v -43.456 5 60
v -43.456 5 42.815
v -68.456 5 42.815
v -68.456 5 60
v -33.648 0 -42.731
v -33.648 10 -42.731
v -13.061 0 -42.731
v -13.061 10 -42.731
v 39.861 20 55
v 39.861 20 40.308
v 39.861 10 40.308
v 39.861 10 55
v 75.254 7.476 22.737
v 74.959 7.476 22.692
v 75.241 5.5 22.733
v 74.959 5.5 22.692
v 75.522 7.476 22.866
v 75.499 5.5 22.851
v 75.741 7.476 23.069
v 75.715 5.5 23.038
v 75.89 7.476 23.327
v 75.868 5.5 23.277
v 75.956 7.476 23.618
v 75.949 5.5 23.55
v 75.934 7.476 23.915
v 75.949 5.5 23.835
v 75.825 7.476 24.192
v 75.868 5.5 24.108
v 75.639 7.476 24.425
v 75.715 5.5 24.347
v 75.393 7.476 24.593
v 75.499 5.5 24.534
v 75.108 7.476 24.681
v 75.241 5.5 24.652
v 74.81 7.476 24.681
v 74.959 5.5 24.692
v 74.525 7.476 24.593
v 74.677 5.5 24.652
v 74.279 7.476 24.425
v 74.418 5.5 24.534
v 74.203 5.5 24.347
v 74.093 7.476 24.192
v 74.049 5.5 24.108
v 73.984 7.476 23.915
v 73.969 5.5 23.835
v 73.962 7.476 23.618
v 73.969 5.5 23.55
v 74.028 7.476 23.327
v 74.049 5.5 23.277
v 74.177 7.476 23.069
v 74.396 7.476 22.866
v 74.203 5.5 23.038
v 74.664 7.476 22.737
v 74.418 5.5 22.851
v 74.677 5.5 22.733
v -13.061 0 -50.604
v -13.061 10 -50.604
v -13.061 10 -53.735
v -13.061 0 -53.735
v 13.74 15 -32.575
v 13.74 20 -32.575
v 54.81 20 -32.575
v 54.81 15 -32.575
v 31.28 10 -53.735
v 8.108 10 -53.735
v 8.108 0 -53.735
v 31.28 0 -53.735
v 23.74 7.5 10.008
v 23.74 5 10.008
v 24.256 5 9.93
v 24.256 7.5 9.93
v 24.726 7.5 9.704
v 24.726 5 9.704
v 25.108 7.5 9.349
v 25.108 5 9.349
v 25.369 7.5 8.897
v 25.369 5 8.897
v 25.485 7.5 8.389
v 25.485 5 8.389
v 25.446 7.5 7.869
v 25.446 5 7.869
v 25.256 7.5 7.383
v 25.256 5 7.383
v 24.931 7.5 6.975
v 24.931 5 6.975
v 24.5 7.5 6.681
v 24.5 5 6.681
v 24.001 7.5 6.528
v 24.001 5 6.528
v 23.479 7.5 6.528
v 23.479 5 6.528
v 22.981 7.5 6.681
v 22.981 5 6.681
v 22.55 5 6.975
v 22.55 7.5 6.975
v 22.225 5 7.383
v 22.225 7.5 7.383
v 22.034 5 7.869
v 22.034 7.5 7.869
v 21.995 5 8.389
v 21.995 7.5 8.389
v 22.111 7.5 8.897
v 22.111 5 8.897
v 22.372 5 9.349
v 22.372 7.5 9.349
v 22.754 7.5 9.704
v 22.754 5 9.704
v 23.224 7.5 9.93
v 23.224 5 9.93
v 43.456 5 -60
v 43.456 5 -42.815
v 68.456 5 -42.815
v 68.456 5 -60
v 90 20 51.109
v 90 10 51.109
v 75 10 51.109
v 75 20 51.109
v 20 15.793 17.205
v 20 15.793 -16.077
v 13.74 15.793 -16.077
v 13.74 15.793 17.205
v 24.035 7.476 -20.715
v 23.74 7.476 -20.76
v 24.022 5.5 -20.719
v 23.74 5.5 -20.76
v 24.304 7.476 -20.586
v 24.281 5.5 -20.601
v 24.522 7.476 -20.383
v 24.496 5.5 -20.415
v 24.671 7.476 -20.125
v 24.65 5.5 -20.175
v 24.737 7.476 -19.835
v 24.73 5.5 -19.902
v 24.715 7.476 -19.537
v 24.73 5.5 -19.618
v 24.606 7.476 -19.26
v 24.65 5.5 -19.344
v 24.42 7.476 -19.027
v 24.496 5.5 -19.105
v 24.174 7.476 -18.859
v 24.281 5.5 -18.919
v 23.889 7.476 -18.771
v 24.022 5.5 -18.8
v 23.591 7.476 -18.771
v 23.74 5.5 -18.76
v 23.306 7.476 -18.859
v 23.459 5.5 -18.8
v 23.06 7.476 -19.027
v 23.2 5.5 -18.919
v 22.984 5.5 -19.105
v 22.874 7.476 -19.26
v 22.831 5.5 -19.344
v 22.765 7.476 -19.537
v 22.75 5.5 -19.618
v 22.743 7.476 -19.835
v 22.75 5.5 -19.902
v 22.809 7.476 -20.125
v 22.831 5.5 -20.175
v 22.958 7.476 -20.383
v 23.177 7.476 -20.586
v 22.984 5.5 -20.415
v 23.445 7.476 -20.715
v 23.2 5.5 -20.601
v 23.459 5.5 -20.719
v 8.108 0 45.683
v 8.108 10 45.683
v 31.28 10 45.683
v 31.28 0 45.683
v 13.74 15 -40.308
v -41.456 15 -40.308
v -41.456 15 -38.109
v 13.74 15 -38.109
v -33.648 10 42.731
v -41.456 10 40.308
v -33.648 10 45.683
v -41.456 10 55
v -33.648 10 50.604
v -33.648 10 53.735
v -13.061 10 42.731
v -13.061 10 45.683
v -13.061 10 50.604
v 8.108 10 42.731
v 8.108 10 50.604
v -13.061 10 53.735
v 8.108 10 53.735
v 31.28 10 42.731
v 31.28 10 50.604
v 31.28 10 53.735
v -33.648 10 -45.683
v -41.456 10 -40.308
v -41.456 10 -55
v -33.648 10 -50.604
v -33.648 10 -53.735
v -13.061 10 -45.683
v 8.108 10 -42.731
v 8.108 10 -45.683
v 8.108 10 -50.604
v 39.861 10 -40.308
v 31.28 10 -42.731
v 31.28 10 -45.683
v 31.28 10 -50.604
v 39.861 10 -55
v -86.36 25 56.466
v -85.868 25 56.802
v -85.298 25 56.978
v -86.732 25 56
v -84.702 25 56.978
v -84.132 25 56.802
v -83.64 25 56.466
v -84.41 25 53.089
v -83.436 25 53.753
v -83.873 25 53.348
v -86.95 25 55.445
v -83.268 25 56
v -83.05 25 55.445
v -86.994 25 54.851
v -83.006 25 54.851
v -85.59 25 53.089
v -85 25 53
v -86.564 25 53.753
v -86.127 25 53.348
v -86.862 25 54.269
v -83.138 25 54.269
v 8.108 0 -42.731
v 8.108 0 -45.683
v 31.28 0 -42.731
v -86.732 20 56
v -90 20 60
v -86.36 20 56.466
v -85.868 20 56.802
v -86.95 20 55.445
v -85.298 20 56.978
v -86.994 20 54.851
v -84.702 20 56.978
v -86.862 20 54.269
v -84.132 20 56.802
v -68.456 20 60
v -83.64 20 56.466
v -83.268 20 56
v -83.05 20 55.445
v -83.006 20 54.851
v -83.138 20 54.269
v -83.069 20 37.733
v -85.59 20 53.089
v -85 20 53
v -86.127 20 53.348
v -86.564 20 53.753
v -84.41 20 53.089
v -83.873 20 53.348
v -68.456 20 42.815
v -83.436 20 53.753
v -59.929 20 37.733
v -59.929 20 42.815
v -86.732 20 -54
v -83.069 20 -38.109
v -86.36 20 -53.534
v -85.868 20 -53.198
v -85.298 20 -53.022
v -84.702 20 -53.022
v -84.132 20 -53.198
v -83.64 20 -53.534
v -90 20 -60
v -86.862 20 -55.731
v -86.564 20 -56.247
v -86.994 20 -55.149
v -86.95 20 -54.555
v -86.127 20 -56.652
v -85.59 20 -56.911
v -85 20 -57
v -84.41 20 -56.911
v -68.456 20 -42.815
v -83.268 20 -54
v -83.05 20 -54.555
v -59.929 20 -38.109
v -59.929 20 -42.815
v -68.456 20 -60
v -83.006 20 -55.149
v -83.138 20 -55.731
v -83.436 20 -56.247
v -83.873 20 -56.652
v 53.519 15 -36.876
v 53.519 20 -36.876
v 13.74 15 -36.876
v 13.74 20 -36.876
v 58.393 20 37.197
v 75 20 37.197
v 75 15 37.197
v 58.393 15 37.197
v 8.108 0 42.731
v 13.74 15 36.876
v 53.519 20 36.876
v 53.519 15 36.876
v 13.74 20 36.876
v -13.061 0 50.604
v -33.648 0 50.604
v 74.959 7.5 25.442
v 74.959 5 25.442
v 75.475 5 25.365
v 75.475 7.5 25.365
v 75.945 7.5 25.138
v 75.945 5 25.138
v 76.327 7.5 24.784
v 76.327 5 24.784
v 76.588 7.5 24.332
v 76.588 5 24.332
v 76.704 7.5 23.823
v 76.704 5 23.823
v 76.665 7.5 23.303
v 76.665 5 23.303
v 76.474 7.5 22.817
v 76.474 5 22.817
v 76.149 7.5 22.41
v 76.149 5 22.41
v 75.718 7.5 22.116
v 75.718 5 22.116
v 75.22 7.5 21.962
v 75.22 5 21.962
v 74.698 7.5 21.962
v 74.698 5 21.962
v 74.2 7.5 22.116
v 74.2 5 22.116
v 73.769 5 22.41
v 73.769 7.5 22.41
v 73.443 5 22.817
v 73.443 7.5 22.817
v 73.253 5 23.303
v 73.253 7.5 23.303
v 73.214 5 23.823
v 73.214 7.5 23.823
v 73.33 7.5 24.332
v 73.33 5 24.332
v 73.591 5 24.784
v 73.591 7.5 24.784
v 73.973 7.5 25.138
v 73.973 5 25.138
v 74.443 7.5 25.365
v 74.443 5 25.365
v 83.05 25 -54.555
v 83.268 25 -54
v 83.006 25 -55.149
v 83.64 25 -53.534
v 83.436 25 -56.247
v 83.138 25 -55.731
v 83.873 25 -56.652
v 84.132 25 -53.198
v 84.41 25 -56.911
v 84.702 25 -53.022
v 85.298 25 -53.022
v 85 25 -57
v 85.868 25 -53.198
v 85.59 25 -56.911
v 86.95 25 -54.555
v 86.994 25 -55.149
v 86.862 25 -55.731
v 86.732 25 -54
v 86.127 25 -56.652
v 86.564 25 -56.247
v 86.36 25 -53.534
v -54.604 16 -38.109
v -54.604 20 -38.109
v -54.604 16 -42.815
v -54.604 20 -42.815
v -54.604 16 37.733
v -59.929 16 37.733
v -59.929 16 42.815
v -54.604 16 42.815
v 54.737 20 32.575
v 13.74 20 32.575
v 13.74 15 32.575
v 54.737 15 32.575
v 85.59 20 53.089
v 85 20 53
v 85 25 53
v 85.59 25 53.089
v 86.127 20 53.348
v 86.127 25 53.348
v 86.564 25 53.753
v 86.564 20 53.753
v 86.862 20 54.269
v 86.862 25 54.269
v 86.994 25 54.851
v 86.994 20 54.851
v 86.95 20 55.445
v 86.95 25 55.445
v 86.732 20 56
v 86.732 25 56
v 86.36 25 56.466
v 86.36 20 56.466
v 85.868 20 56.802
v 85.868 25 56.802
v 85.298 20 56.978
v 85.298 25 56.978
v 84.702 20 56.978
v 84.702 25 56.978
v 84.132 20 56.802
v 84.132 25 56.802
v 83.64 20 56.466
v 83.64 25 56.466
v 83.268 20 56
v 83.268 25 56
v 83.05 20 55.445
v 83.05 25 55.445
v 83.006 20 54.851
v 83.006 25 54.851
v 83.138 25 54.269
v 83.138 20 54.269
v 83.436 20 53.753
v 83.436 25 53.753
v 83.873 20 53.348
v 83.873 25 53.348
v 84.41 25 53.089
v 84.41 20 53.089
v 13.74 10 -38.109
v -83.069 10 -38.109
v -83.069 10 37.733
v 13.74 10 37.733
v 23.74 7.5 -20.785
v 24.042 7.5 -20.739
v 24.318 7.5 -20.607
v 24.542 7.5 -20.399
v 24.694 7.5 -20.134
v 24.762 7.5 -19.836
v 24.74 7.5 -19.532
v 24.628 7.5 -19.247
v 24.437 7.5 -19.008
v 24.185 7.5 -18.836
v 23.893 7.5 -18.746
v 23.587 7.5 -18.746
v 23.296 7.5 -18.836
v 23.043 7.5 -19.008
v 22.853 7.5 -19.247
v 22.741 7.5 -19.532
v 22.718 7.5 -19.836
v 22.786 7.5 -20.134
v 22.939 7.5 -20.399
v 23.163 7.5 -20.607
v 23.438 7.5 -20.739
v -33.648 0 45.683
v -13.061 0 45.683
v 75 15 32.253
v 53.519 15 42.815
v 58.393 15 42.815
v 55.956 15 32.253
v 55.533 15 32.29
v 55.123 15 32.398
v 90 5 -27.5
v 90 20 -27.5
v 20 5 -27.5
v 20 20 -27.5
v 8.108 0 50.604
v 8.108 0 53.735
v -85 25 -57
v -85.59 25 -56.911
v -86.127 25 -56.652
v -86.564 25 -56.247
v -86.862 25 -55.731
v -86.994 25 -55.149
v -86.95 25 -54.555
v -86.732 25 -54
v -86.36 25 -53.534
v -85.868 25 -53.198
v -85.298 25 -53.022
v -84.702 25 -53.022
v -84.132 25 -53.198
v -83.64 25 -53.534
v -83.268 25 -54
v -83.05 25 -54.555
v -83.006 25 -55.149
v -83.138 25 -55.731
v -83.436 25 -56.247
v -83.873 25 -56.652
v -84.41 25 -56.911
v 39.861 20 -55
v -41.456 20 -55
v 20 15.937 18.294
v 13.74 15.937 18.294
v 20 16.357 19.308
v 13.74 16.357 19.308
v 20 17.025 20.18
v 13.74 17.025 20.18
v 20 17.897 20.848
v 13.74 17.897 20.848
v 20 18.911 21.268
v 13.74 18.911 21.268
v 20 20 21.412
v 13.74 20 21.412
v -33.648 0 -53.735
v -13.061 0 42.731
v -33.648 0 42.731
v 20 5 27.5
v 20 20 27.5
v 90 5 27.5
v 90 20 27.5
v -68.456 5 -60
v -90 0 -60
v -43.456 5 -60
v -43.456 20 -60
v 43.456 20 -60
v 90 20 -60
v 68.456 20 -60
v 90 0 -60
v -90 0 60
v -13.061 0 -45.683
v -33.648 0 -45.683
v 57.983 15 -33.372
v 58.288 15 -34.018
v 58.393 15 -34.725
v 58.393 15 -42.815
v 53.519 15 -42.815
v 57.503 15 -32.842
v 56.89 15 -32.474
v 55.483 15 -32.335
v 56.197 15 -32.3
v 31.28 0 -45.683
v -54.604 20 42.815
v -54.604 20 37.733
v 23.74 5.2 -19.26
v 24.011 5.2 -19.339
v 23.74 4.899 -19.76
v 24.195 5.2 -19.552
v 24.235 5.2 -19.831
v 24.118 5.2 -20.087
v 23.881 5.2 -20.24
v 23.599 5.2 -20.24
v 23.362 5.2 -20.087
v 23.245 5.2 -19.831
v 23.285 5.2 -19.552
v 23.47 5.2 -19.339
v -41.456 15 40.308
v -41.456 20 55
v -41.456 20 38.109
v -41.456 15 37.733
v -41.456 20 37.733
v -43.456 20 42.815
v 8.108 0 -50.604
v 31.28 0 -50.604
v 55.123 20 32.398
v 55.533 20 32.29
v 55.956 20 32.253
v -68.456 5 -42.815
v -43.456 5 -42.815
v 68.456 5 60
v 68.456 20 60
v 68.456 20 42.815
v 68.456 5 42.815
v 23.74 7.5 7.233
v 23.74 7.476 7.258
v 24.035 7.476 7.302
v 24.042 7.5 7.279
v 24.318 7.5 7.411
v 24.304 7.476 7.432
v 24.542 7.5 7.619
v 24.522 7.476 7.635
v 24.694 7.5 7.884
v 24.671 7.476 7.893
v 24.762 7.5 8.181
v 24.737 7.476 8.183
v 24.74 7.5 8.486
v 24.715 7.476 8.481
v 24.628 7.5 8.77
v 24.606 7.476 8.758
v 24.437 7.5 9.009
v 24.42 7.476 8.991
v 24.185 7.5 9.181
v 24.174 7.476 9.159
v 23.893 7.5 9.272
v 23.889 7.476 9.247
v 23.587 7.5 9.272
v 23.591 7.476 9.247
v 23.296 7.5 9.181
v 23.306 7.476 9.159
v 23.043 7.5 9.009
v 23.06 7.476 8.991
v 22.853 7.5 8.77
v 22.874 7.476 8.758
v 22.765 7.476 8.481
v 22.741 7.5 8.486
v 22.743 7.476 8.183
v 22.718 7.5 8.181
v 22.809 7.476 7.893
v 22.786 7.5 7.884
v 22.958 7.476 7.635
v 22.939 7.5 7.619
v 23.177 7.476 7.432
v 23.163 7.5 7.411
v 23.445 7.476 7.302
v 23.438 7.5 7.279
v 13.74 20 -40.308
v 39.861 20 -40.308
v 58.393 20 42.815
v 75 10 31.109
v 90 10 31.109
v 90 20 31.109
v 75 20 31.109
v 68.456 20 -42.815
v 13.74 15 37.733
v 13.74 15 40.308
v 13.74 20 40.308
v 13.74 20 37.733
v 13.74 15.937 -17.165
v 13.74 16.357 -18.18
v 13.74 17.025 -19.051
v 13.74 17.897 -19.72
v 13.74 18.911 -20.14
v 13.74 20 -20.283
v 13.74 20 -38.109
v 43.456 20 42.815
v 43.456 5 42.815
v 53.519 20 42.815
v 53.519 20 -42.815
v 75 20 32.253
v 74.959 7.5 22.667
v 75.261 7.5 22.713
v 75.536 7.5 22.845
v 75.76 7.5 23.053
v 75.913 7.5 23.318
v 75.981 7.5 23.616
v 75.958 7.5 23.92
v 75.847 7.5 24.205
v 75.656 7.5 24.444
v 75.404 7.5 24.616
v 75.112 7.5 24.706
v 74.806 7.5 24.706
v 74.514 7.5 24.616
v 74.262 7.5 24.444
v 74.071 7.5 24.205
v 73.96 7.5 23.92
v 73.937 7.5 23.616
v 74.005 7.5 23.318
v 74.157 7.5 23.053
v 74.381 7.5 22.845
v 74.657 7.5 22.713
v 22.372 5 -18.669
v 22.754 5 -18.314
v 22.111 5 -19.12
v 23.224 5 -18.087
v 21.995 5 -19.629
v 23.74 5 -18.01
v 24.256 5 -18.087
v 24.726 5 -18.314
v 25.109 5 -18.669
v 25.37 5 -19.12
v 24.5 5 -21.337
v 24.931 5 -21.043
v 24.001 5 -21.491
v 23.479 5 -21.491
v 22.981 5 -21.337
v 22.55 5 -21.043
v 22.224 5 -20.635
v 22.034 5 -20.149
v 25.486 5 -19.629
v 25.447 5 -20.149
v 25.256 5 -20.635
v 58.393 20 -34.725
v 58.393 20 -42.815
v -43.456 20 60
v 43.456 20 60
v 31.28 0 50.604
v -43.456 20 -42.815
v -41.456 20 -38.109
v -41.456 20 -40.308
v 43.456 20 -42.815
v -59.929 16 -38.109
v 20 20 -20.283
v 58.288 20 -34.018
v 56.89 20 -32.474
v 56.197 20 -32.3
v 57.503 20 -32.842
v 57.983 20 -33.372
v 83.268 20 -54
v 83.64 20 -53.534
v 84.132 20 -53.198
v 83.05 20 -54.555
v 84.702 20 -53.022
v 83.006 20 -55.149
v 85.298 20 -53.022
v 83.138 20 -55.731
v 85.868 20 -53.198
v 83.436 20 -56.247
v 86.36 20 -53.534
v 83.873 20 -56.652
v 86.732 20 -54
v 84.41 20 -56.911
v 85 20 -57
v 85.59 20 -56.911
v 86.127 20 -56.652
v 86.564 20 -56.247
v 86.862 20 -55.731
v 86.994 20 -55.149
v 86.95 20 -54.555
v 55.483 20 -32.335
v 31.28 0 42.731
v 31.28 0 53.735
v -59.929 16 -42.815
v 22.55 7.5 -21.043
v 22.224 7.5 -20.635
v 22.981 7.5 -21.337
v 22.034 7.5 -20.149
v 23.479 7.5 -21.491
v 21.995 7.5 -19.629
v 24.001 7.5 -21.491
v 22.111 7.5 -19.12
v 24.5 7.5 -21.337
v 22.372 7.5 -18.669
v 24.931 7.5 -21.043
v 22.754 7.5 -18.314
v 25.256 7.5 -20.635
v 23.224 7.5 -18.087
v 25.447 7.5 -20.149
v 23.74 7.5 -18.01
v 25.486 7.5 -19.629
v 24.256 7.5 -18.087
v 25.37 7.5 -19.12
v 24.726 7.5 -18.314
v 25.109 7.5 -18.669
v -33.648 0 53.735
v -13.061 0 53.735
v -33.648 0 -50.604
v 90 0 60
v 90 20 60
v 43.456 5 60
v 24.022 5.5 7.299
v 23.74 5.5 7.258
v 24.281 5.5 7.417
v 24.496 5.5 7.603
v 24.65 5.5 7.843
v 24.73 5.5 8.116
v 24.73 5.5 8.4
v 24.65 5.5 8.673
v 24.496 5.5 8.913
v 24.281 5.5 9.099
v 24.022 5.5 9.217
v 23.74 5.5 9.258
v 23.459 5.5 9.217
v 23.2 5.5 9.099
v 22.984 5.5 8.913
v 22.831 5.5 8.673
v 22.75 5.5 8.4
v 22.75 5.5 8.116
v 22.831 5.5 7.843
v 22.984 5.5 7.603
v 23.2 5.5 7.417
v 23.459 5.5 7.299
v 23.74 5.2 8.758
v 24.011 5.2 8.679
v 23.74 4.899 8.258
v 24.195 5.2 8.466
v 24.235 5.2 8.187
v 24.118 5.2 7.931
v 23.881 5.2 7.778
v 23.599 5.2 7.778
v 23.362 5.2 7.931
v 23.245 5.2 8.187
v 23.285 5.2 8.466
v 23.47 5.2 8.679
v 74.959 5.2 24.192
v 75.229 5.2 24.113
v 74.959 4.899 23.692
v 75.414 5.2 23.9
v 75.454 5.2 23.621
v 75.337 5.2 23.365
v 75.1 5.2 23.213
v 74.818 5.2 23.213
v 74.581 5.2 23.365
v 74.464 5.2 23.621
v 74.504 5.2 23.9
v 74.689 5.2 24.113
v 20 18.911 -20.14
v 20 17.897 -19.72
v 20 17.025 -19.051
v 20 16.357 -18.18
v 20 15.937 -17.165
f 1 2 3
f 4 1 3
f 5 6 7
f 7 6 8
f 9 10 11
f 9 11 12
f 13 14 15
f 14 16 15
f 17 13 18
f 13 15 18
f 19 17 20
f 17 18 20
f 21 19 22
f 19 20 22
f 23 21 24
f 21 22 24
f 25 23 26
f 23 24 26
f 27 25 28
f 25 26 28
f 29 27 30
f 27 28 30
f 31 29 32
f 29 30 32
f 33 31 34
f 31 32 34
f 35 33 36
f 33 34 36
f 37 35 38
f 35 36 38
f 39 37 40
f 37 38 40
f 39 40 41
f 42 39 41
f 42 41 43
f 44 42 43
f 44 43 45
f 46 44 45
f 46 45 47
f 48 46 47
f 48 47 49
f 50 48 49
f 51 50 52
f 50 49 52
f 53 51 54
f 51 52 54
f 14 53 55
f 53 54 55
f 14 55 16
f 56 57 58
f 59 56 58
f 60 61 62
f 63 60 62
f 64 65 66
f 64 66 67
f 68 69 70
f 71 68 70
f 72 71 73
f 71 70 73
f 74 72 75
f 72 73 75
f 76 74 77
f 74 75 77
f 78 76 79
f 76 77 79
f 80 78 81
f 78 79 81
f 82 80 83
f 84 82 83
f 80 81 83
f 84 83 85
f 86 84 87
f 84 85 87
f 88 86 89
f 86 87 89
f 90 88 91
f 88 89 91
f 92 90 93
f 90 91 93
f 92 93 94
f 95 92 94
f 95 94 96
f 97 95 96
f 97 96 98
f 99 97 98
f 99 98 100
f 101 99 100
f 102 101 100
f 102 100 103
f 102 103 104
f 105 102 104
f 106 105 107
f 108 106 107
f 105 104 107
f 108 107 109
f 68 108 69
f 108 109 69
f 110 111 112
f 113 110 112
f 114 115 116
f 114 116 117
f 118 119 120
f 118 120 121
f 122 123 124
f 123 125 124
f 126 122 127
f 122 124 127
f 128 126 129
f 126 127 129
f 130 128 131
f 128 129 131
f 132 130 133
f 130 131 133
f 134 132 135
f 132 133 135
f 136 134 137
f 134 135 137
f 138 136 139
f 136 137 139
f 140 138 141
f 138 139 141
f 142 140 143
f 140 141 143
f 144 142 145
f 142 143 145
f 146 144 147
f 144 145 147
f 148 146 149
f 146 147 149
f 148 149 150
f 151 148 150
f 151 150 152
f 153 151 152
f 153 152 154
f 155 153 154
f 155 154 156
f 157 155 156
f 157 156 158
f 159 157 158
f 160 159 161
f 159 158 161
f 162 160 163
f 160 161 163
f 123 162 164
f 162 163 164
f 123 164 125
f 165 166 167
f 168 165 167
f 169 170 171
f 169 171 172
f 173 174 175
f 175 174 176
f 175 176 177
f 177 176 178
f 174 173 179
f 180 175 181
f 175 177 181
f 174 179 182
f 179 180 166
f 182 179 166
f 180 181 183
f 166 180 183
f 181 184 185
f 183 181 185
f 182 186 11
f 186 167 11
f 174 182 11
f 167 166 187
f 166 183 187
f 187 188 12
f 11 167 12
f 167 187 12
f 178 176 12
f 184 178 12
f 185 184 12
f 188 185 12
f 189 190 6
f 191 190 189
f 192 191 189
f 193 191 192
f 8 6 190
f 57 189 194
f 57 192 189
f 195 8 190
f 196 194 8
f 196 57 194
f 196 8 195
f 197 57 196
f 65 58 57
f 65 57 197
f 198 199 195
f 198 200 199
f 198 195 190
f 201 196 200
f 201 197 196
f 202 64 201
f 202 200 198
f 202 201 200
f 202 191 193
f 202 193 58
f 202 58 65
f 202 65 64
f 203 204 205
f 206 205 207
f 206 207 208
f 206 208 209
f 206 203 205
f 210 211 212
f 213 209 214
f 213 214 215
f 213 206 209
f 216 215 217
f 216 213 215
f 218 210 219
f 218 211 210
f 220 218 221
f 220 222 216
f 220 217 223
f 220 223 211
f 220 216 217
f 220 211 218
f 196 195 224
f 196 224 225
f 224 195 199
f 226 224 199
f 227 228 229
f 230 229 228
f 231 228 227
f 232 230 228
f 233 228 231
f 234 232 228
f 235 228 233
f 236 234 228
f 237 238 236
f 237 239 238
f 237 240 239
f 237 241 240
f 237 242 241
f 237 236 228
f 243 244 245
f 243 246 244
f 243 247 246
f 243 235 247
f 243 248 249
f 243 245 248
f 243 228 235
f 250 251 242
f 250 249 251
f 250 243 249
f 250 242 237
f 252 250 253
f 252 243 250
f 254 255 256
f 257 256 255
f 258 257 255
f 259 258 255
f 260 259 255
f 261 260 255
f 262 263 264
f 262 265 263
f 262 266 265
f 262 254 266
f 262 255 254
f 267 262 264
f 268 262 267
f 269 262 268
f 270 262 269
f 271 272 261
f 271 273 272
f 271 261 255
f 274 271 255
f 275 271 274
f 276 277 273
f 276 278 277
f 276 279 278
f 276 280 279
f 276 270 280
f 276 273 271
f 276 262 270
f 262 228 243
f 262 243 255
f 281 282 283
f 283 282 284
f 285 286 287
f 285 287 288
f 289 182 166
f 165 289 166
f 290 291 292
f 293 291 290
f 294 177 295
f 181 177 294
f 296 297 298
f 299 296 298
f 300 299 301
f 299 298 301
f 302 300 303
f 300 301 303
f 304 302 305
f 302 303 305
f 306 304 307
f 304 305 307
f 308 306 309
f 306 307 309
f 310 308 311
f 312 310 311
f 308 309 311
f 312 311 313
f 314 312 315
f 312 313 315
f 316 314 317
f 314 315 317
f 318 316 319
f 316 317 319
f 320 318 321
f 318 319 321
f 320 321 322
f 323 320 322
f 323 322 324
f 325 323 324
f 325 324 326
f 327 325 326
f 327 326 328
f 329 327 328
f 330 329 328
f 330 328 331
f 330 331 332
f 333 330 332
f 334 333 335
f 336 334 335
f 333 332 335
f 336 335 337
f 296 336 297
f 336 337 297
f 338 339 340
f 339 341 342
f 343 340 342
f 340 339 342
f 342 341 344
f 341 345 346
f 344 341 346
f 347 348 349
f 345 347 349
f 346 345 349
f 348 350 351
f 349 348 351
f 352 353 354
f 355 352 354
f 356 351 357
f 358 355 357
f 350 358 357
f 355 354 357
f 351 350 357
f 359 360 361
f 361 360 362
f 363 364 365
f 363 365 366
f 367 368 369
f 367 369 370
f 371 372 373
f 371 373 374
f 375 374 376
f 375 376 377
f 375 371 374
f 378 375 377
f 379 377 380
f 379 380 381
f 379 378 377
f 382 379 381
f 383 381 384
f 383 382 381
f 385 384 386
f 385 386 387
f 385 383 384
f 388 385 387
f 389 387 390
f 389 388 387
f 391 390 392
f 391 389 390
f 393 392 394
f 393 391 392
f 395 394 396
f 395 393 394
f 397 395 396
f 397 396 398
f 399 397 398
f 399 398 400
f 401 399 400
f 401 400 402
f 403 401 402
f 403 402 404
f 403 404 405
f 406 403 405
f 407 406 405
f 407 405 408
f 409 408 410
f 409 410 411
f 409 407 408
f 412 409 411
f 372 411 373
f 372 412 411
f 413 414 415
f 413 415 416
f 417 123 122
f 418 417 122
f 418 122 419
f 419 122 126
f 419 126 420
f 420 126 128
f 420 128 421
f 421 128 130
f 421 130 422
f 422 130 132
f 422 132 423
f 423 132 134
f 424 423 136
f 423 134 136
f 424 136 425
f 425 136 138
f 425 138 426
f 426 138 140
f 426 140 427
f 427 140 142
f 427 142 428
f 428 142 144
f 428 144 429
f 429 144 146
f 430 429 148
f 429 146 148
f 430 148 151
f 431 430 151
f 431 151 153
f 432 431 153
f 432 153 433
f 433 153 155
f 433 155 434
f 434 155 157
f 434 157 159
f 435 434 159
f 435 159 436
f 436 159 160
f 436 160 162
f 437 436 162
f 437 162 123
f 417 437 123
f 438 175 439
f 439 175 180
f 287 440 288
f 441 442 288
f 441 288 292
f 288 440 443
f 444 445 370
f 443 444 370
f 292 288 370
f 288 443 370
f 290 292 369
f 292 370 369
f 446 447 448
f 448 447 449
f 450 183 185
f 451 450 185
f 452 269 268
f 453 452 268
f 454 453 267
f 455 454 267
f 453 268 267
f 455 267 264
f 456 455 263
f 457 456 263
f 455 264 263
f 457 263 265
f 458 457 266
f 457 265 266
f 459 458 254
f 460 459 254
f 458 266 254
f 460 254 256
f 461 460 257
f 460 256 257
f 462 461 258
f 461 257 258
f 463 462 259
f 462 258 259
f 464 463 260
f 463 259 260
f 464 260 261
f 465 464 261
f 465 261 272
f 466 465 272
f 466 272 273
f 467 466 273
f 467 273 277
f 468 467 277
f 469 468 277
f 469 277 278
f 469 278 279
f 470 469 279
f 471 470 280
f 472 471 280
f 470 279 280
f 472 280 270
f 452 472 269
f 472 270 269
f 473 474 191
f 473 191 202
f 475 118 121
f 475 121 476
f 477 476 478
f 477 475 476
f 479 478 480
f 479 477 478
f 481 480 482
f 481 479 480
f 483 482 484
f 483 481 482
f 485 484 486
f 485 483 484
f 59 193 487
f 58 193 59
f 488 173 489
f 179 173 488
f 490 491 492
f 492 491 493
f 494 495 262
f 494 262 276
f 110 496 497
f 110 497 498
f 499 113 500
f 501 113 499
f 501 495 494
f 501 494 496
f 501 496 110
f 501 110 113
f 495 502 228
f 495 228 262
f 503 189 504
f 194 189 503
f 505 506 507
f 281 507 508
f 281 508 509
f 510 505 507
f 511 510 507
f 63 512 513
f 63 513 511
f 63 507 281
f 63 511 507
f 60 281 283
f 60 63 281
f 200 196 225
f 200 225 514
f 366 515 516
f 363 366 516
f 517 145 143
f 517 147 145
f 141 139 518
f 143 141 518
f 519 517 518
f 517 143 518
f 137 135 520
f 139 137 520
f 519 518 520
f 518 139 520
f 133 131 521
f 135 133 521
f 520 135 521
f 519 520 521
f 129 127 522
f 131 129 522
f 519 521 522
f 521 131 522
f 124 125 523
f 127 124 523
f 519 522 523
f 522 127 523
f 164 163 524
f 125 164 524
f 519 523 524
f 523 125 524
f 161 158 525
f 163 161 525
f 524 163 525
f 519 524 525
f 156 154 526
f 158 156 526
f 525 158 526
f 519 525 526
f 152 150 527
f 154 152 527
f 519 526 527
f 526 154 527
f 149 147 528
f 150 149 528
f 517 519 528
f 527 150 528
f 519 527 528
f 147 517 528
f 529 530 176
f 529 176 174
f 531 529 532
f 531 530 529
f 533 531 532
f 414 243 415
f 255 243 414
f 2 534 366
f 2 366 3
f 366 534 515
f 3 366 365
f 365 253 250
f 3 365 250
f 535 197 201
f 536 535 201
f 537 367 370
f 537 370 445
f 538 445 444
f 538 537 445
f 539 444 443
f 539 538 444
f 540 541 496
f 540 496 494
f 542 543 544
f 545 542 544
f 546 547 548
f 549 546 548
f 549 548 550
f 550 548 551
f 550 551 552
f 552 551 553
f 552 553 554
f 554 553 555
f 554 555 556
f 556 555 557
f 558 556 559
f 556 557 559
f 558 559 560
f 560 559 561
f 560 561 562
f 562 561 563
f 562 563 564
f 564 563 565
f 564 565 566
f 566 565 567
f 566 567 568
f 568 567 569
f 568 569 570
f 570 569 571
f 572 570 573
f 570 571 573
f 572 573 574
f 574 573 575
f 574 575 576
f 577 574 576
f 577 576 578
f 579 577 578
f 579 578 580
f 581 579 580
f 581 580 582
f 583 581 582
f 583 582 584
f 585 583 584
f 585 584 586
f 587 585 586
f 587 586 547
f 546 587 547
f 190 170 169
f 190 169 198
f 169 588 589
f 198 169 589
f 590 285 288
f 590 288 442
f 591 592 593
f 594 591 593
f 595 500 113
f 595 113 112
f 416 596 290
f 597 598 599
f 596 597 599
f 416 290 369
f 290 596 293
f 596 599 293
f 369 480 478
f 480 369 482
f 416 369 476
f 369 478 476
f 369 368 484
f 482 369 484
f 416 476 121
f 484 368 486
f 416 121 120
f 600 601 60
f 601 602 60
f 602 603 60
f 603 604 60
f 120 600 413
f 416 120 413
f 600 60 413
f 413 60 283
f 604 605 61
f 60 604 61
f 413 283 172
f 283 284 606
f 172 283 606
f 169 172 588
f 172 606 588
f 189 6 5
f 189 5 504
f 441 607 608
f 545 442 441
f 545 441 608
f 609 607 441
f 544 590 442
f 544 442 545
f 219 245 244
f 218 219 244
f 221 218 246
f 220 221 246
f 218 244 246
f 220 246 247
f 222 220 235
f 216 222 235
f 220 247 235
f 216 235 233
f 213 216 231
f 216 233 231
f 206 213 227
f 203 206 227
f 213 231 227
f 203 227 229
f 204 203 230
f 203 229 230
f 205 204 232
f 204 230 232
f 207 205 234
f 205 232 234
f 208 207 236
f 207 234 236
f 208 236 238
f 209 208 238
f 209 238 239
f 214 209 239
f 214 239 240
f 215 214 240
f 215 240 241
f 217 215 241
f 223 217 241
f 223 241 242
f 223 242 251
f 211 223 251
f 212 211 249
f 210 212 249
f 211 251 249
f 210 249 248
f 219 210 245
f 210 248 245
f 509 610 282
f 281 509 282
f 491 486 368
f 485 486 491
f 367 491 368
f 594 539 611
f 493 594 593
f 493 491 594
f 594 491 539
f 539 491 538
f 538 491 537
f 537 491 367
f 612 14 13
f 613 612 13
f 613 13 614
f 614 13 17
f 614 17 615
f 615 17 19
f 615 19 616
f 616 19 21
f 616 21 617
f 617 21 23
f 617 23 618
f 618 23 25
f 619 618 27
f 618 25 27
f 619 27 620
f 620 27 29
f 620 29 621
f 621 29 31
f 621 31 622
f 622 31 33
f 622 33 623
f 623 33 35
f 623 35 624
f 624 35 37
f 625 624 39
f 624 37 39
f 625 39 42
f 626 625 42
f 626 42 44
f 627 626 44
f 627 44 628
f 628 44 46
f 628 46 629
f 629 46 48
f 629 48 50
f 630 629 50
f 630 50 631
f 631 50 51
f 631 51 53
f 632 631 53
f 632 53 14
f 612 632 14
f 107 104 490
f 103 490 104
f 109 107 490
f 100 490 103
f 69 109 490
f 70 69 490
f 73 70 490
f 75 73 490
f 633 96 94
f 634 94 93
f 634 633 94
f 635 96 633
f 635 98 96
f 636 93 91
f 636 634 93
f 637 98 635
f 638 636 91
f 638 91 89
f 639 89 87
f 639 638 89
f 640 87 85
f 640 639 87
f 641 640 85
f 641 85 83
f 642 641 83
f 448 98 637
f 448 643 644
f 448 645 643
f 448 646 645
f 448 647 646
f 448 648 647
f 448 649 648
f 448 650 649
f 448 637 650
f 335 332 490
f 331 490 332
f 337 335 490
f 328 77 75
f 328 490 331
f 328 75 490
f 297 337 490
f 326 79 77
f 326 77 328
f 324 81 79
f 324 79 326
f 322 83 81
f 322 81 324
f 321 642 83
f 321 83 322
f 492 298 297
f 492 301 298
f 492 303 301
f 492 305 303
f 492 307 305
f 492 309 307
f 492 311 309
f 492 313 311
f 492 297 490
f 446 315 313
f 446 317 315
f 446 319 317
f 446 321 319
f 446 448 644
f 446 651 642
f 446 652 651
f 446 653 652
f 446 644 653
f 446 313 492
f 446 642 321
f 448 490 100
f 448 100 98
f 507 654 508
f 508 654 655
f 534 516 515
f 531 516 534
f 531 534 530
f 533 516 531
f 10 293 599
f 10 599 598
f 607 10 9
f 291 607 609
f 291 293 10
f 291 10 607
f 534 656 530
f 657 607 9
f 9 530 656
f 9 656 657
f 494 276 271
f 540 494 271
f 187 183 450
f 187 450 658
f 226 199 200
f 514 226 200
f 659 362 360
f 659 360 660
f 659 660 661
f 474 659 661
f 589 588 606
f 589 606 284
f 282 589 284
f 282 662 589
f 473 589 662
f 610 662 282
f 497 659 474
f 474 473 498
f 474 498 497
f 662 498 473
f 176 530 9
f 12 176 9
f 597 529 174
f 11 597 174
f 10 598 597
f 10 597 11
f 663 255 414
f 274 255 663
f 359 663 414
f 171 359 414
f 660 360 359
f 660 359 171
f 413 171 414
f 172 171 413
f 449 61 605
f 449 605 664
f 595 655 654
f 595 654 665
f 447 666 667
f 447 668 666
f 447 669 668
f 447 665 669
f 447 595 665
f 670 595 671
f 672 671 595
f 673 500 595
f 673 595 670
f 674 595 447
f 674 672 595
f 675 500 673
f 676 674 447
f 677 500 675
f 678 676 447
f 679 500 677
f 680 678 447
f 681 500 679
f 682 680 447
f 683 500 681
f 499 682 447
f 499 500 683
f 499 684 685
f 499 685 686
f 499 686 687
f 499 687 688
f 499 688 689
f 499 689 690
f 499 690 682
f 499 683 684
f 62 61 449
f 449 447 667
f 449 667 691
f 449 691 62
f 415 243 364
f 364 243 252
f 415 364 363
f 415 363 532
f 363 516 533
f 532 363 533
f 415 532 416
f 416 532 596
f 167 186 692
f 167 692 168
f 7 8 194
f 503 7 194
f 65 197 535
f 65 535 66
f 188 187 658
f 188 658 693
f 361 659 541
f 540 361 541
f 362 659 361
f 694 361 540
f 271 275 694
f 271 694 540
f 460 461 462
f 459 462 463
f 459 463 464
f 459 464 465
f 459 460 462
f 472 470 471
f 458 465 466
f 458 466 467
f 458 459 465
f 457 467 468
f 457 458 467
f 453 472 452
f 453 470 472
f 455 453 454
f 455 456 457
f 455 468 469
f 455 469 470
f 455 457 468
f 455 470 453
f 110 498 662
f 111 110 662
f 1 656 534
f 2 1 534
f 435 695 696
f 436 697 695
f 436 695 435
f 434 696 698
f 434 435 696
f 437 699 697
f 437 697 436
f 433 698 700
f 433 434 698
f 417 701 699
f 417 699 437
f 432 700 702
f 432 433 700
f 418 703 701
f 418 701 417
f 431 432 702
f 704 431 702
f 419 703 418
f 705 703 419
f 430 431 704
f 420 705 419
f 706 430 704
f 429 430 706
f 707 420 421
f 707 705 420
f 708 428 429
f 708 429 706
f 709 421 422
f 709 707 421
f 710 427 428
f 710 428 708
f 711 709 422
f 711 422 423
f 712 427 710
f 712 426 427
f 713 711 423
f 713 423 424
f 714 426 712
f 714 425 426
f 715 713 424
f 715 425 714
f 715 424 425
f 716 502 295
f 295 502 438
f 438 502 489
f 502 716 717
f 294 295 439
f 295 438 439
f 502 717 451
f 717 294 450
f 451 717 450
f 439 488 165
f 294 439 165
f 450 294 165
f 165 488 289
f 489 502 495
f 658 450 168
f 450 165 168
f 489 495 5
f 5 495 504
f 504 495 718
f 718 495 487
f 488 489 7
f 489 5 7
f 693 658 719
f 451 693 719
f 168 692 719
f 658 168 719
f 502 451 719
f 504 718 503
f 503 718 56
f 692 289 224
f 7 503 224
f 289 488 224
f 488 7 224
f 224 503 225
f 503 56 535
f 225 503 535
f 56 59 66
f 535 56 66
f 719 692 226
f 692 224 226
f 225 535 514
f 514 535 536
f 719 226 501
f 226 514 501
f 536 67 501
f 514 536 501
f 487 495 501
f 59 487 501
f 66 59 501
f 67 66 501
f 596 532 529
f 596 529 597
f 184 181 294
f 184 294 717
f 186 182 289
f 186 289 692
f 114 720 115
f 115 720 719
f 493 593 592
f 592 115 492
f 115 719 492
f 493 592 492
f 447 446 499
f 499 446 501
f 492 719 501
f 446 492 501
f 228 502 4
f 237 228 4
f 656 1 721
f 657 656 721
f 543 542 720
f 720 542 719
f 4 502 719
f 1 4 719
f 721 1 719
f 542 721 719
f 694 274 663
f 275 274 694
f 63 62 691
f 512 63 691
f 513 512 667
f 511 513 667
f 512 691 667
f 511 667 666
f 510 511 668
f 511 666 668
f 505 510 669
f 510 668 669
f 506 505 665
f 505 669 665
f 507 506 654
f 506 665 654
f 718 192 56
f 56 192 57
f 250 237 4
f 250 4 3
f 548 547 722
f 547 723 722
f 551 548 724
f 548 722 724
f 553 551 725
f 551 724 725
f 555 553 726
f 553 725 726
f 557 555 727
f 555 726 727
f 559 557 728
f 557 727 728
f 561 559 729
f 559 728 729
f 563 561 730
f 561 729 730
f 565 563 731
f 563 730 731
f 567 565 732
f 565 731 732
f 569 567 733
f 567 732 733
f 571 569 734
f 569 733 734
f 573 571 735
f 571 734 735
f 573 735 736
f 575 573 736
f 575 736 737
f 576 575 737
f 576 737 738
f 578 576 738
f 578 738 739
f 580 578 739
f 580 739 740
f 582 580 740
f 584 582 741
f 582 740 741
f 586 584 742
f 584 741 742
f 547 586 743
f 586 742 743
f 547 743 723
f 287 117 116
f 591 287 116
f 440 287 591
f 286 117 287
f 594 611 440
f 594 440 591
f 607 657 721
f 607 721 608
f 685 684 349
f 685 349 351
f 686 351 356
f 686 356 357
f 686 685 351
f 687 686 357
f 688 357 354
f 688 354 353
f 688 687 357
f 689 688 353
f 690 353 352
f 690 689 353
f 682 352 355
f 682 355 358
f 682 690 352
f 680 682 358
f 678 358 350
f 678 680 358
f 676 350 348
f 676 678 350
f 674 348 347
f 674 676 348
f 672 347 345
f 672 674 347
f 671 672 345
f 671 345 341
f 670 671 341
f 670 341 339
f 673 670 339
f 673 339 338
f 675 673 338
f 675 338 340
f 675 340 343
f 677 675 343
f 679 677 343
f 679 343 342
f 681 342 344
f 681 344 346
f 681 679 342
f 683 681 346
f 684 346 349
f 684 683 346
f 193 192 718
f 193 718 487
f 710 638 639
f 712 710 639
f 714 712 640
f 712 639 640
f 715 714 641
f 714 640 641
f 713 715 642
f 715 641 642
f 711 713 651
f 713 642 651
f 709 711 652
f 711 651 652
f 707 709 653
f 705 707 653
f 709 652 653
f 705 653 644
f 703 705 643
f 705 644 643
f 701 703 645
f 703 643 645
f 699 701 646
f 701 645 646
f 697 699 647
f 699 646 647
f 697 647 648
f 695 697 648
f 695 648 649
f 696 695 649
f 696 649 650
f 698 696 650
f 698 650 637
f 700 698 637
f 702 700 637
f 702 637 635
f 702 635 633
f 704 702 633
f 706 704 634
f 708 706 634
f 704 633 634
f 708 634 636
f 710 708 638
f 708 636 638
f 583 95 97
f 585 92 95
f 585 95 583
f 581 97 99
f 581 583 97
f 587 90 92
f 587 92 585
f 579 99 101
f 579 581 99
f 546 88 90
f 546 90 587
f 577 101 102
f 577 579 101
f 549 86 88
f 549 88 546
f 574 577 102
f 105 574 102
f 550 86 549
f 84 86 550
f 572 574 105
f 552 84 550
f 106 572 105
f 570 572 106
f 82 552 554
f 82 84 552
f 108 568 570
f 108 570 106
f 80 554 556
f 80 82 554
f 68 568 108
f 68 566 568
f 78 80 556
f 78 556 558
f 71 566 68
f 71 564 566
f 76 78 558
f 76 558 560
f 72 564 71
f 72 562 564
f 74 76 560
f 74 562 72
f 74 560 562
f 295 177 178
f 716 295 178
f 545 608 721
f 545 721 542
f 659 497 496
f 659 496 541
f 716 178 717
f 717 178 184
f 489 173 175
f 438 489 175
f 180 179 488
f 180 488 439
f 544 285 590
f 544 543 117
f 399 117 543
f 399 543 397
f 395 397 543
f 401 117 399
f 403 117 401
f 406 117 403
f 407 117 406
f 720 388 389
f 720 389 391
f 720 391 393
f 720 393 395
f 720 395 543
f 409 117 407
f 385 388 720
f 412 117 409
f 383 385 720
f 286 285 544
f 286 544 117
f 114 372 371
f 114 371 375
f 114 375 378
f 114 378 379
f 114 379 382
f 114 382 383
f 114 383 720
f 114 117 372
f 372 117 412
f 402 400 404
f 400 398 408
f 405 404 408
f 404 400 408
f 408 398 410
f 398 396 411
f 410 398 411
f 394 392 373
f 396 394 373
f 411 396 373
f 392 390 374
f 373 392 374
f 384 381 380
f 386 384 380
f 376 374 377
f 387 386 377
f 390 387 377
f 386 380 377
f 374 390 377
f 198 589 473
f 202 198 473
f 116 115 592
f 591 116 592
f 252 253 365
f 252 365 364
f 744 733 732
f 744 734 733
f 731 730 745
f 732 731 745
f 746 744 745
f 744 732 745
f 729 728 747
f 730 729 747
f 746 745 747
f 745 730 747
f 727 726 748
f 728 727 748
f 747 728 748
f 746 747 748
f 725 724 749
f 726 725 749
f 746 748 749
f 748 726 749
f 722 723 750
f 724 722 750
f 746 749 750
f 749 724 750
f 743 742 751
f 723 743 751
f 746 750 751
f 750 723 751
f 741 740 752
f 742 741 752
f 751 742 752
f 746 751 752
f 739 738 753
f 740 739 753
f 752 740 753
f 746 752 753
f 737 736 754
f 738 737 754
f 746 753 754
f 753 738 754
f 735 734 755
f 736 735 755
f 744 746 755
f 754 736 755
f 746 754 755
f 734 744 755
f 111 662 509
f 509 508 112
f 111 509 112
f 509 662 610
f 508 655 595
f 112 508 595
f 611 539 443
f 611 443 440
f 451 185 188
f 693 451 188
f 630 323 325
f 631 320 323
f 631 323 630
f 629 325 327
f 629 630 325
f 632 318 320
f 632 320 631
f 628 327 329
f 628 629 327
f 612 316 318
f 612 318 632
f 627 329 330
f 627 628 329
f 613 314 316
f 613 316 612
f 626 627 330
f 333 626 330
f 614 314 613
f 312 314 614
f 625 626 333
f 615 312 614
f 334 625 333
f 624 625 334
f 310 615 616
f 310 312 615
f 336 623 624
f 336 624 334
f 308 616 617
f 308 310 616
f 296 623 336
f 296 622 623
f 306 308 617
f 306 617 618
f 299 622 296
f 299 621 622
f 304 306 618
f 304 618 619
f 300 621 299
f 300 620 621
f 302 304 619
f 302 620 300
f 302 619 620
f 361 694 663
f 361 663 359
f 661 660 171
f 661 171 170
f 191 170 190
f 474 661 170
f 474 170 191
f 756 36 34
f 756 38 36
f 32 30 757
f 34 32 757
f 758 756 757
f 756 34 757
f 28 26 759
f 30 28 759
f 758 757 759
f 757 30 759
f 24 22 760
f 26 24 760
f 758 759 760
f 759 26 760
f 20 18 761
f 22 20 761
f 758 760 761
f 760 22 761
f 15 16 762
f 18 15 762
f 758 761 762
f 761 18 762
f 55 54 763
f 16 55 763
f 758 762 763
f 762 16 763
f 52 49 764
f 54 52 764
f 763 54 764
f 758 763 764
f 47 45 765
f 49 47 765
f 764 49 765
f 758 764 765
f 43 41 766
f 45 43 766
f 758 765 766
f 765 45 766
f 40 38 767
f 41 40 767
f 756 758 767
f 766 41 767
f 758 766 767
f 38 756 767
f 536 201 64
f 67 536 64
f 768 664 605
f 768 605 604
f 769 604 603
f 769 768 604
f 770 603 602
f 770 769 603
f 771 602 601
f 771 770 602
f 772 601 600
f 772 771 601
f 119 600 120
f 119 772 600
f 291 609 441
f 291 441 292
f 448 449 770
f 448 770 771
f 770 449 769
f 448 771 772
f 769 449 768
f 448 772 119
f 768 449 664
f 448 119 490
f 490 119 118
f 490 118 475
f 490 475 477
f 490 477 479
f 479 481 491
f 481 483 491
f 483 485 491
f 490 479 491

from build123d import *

# Parameters (mm, degrees)
SKETCH1_W                          = 180
SKETCH1_H                          = 120
BOSS_EXTRUDE1_DEPTH                = 20
CUT_EXTRUDE1_DEPTH                 = 15
SKETCH3_W                          = 25
SKETCH3_H                          = 34.37
CUT_EXTRUDE2_DEPTH                 = 15
MIRROR2_COPY_1_SKETCH_W            = 25
MIRROR2_COPY_1_SKETCH_H            = 34.37
MIRROR2_COPY_1_DEPTH               = 15
SKETCH4_W                          = 96.808518295
SKETCH4_H                          = 75.84152956
CUT_EXTRUDE4_DEPTH                 = 10
SKETCH6_R                          = 1.750328968
SKETCH6_R_2                        = 1.75
BOSS_EXTRUDE2_DEPTH                = 2.5
F_2_0_2_DIAMETER_HOLE1_D           = 2
F_2_0_2_DIAMETER_HOLE1_DEPTH       = 2
F_2_0_2_DIAMETER_HOLE1_CSINK_D     = 2.05
F_2_0_2_DIAMETER_HOLE1_CSINK_ANGLE = 92
F_2_0_2_DIAMETER_HOLE1_TIP         = 0.600860619
CUT_EXTRUDE5_DEPTH                 = 10
SKETCH23_R                         = 2
BOSS_EXTRUDE3_DEPTH                = 5
SKETCH25_W                         = 5.325181223
SKETCH25_H                         = 5.082469794
SKETCH25_H_2                       = 4.706000646
CUT_EXTRUDE10_DEPTH                = 4
CUT_EXTRUDE11_DEPTH                = 5
SKETCH28_W                         = 81.316631719
SKETCH28_H                         = 14.691658707
CUT_EXTRUDE12_DEPTH                = 10
SKETCH29_W                         = 55.195697226
SKETCH29_H                         = 2.199341939
CUT_EXTRUDE13_DEPTH                = 5
SKETCH30_W                         = 23.172037828
SKETCH30_H                         = 3.131356463
SKETCH30_H_2                       = 2.952421808
SKETCH30_W_2                       = 20.586646559
CUT_EXTRUDE15_DEPTH                = 110.201648339
SKETCH31_W                         = 55.195697226
SKETCH31_H                         = 0.376469148
CUT_EXTRUDE16_DEPTH                = 5
SKETCH32_W                         = 20
SKETCH32_H                         = 10
CUT_EXTRUDE17_DEPTH                = 15
CUT_EXTRUDE18_DEPTH                = 5


with BuildPart() as part:
    # Sketch1 → Boss-Extrude1 (new body)
    with BuildSketch(Plane(origin=(0, 0, 0), x_dir=(1, 0, 0), z_dir=(0, 1, 0))):
        Rectangle(SKETCH1_W, SKETCH1_H)
    extrude(amount=BOSS_EXTRUDE1_DEPTH)

    # Sketch2 → Cut-Extrude1 (cut)
    with BuildSketch(Plane(origin=(0, 20, 0), x_dir=(1, 0, 0), z_dir=(0, 1, 0))):
        Polygon((90, 0), (90, 27.5), (20, 27.5), (20, -27.5), (90, -27.5), align=None)
    extrude(amount=-CUT_EXTRUDE1_DEPTH, mode=Mode.SUBTRACT)

    # Sketch3 → Cut-Extrude2 (cut)
    with BuildSketch(Plane(origin=(0, 20, 0), x_dir=(1, 0, 0), z_dir=(0, 1, 0))):
        with Locations((55.95586419, -60)):
            Rectangle(SKETCH3_W, SKETCH3_H)
    cut_extrude2 = extrude(amount=-CUT_EXTRUDE2_DEPTH, mode=Mode.SUBTRACT)

    # Mirror1: Cut-Extrude2 across plane
    add(cut_extrude2.mirror(Plane(origin=(0, 0, 0), x_dir=(0, 0, 1), z_dir=(1, 0, 0))), mode=Mode.SUBTRACT)

    # Mirror2: Cut-Extrude2 across plane
    add(cut_extrude2.mirror(Plane.XY), mode=Mode.SUBTRACT)

    # Mirror2 copy 1 sketch → Mirror2 copy 1 (cut)
    with BuildSketch(Plane(origin=(0, 20, 0), x_dir=(-1, 0, 0), z_dir=(0, 1, 0))):
        with Locations((55.95586419, -60)):
            Rectangle(MIRROR2_COPY_1_SKETCH_W, MIRROR2_COPY_1_SKETCH_H)
    extrude(amount=-MIRROR2_COPY_1_DEPTH, mode=Mode.SUBTRACT)

    # Sketch4 → Cut-Extrude4 (cut)
    with BuildSketch(Plane(origin=(0, 20, 0), x_dir=(1, 0, 0), z_dir=(0, 1, 0))):
        with Locations((-34.664426112, 0.188234574)):
            Rectangle(SKETCH4_W, SKETCH4_H)
    extrude(amount=-CUT_EXTRUDE4_DEPTH, mode=Mode.SUBTRACT)

    # Sketch6 → Boss-Extrude2 (add)
    with BuildSketch(Plane(origin=(0, 5, 0), x_dir=(1, 0, 0), z_dir=(0, 1, 0))):
        with Locations(Location((23.740233284, 19.759861377, 0), (0, 0, 270))):
            Circle(SKETCH6_R)
        with Locations(Location((23.740233284, -8.257995296, 0), (0, 0, 270))):
            Circle(SKETCH6_R_2)
        with Locations(Location((74.958841447, -23.692393533, 0), (0, 0, 270))):
            Circle(SKETCH6_R_2)
    extrude(amount=BOSS_EXTRUDE2_DEPTH)

    # Ø2.0 (2) Diameter Hole1
    with Locations(Plane(origin=(23.740233284, 7.5, -19.759861377), x_dir=(0, 0, 1), z_dir=(0, 1, 0))):
        with Locations((0, 0), (28.017856673, 0), (43.45225491, 51.218608163)):
            CounterSinkHole(F_2_0_2_DIAMETER_HOLE1_D / 2, F_2_0_2_DIAMETER_HOLE1_CSINK_D / 2, depth=F_2_0_2_DIAMETER_HOLE1_DEPTH, counter_sink_angle=F_2_0_2_DIAMETER_HOLE1_CSINK_ANGLE)
            with Locations((0, 0, -(F_2_0_2_DIAMETER_HOLE1_DEPTH + F_2_0_2_DIAMETER_HOLE1_TIP / 2))):  # 118° drill point
                Cone(0, F_2_0_2_DIAMETER_HOLE1_D / 2, F_2_0_2_DIAMETER_HOLE1_TIP, mode=Mode.SUBTRACT)

    # Sketch19 → Cut-Extrude5 (cut)
    with BuildSketch(Plane(origin=(20, 0, 0), x_dir=(0, 0, -1), z_dir=(1, 0, 0))):
        with BuildLine():
            Line((-17.205162996, 24.206637085), (16.076682843, 24.206637085))
            ThreePointArc((16.076682843, 24.206637085), (20.283319928, 20), (16.076682843, 15.793362915))
            Line((16.076682843, 15.793362915), (-17.205162996, 15.793362915))
            ThreePointArc((-17.205162996, 15.793362915), (-21.411800081, 20), (-17.205162996, 24.206637085))
        make_face()
    extrude(amount=-CUT_EXTRUDE5_DEPTH, mode=Mode.SUBTRACT)

    # Sketch23 → Boss-Extrude3 (add)
    with BuildSketch(Plane(origin=(0, 20, 0), x_dir=(1, 0, 0), z_dir=(0, 1, 0))):
        with Locations(Location((-85, 55, 0), (0, 0, 90))):
            Circle(SKETCH23_R)
        with Locations(Location((-85, -55, 0), (0, 0, 90))):
            Circle(SKETCH23_R)
    boss_extrude3 = extrude(amount=BOSS_EXTRUDE3_DEPTH)

    # Mirror3: Boss-Extrude3 across plane
    add(boss_extrude3.mirror(Plane(origin=(0, 0, 0), x_dir=(0, 0, 1), z_dir=(1, 0, 0))))

    # Sketch25 → Cut-Extrude10 (cut)
    with BuildSketch(Plane(origin=(0, 20, 0), x_dir=(1, 0, 0), z_dir=(0, 1, 0))):
        with Locations((-57.266281273, -40.273765103)):
            Rectangle(SKETCH25_W, SKETCH25_H)
        with Locations((-57.266281273, 40.461999677)):
            Rectangle(SKETCH25_W, SKETCH25_H_2)
    extrude(amount=-CUT_EXTRUDE10_DEPTH, mode=Mode.SUBTRACT)

    # Sketch27 → Cut-Extrude11 (cut)
    with BuildSketch(Plane(origin=(0, 20, 0), x_dir=(1, 0, 0), z_dir=(0, 1, 0))):
        with BuildLine():
            Line((53.518871282, -42.815), (53.518871282, -34.725256946))
            ThreePointArc((53.518871282, -34.725256946), (55.95586419, -32.288264038), (58.392857098, -34.725256946))
            Line((58.392857098, -34.725256946), (58.392857098, -42.815))
            ThreePointArc((58.392857098, -42.815), (55.95586419, -45.251992908), (53.518871282, -42.815))
        make_face()
        with BuildLine():
            Line((55.95586419, -36.875864951), (13.739833036, -36.875864951))
            ThreePointArc((13.739833036, -36.875864951), (11.589225031, -34.725256946), (13.739833036, -32.574648942))
            Line((13.739833036, -32.574648942), (55.95586419, -32.574648942))
            ThreePointArc((55.95586419, -32.574648942), (58.106472195, -34.725256946), (55.95586419, -36.875864951))
        make_face()
    cut_extrude11 = extrude(amount=-CUT_EXTRUDE11_DEPTH, mode=Mode.SUBTRACT)

    # Mirror4: Cut-Extrude11 across plane
    add(cut_extrude11.mirror(Plane.XY), mode=Mode.SUBTRACT)

    # Sketch28 → Cut-Extrude12 (cut)
    with BuildSketch(Plane(origin=(0, 20, 0), x_dir=(1, 0, 0), z_dir=(0, 1, 0))):
        with Locations((-0.79754833, 47.654170647)):
            Rectangle(SKETCH28_W, SKETCH28_H)
    cut_extrude12 = extrude(amount=-CUT_EXTRUDE12_DEPTH, mode=Mode.SUBTRACT)

    # Sketch29 → Cut-Extrude13 (cut)
    with BuildSketch(Plane(origin=(0, 20, 0), x_dir=(1, 0, 0), z_dir=(0, 1, 0))):
        with Locations((-13.858015577, 39.208670324)):
            Rectangle(SKETCH29_W, SKETCH29_H)
    cut_extrude13 = extrude(amount=-CUT_EXTRUDE13_DEPTH, mode=Mode.SUBTRACT)

    # Sketch30 → Cut-Extrude15 (cut, through all)
    with BuildSketch(Plane(origin=(0, 10, 0), x_dir=(1, 0, 0), z_dir=(0, 1, 0))):
        with Locations((19.694260821, 52.169495653)):
            Rectangle(SKETCH30_W, SKETCH30_H)
        with Locations((19.694260821, 44.206903503)):
            Rectangle(SKETCH30_W, SKETCH30_H_2)
        with Locations((-23.35450663, 52.169495653)):
            Rectangle(SKETCH30_W_2, SKETCH30_H)
        with Locations((-23.35450663, 44.206903503)):
            Rectangle(SKETCH30_W_2, SKETCH30_H_2)
    cut_extrude15 = extrude(amount=-CUT_EXTRUDE15_DEPTH, mode=Mode.SUBTRACT)

    # Mirror5: Cut-Extrude12, Cut-Extrude13, Cut-Extrude15 across plane
    add(cut_extrude12.mirror(Plane.XY), mode=Mode.SUBTRACT)
    add(cut_extrude13.mirror(Plane.XY), mode=Mode.SUBTRACT)
    add(cut_extrude15.mirror(Plane.XY), mode=Mode.SUBTRACT)

    # Sketch31 → Cut-Extrude16 (cut)
    with BuildSketch(Plane(origin=(0, 20, 0), x_dir=(1, 0, 0), z_dir=(0, 1, 0))):
        with Locations((-13.858015577, -37.92076478)):
            Rectangle(SKETCH31_W, SKETCH31_H)
    extrude(amount=-CUT_EXTRUDE16_DEPTH, mode=Mode.SUBTRACT)

    # Sketch32 → Cut-Extrude17 (cut)
    with BuildSketch(Plane(origin=(90, 0, 0), x_dir=(0, 0, -1), z_dir=(1, 0, 0))):
        with Locations((-41.109013554, 15)):
            Rectangle(SKETCH32_W, SKETCH32_H)
    extrude(amount=-CUT_EXTRUDE17_DEPTH, mode=Mode.SUBTRACT)

    # Sketch33 → Cut-Extrude18 (cut)
    with BuildSketch(Plane(origin=(0, 20, 0), x_dir=(1, 0, 0), z_dir=(0, 1, 0))):
        with BuildLine():
            Line((55.95586419, -32.253444684), (75, -32.253444684))
            ThreePointArc((75, -32.253444684), (77.471812262, -34.725256946), (75, -37.197069209))
            Line((75, -37.197069209), (55.95586419, -37.197069209))
            ThreePointArc((55.95586419, -37.197069209), (53.484051928, -34.725256946), (55.95586419, -32.253444684))
        make_face()
    extrude(amount=-CUT_EXTRUDE18_DEPTH, mode=Mode.SUBTRACT)


solid = part.part
